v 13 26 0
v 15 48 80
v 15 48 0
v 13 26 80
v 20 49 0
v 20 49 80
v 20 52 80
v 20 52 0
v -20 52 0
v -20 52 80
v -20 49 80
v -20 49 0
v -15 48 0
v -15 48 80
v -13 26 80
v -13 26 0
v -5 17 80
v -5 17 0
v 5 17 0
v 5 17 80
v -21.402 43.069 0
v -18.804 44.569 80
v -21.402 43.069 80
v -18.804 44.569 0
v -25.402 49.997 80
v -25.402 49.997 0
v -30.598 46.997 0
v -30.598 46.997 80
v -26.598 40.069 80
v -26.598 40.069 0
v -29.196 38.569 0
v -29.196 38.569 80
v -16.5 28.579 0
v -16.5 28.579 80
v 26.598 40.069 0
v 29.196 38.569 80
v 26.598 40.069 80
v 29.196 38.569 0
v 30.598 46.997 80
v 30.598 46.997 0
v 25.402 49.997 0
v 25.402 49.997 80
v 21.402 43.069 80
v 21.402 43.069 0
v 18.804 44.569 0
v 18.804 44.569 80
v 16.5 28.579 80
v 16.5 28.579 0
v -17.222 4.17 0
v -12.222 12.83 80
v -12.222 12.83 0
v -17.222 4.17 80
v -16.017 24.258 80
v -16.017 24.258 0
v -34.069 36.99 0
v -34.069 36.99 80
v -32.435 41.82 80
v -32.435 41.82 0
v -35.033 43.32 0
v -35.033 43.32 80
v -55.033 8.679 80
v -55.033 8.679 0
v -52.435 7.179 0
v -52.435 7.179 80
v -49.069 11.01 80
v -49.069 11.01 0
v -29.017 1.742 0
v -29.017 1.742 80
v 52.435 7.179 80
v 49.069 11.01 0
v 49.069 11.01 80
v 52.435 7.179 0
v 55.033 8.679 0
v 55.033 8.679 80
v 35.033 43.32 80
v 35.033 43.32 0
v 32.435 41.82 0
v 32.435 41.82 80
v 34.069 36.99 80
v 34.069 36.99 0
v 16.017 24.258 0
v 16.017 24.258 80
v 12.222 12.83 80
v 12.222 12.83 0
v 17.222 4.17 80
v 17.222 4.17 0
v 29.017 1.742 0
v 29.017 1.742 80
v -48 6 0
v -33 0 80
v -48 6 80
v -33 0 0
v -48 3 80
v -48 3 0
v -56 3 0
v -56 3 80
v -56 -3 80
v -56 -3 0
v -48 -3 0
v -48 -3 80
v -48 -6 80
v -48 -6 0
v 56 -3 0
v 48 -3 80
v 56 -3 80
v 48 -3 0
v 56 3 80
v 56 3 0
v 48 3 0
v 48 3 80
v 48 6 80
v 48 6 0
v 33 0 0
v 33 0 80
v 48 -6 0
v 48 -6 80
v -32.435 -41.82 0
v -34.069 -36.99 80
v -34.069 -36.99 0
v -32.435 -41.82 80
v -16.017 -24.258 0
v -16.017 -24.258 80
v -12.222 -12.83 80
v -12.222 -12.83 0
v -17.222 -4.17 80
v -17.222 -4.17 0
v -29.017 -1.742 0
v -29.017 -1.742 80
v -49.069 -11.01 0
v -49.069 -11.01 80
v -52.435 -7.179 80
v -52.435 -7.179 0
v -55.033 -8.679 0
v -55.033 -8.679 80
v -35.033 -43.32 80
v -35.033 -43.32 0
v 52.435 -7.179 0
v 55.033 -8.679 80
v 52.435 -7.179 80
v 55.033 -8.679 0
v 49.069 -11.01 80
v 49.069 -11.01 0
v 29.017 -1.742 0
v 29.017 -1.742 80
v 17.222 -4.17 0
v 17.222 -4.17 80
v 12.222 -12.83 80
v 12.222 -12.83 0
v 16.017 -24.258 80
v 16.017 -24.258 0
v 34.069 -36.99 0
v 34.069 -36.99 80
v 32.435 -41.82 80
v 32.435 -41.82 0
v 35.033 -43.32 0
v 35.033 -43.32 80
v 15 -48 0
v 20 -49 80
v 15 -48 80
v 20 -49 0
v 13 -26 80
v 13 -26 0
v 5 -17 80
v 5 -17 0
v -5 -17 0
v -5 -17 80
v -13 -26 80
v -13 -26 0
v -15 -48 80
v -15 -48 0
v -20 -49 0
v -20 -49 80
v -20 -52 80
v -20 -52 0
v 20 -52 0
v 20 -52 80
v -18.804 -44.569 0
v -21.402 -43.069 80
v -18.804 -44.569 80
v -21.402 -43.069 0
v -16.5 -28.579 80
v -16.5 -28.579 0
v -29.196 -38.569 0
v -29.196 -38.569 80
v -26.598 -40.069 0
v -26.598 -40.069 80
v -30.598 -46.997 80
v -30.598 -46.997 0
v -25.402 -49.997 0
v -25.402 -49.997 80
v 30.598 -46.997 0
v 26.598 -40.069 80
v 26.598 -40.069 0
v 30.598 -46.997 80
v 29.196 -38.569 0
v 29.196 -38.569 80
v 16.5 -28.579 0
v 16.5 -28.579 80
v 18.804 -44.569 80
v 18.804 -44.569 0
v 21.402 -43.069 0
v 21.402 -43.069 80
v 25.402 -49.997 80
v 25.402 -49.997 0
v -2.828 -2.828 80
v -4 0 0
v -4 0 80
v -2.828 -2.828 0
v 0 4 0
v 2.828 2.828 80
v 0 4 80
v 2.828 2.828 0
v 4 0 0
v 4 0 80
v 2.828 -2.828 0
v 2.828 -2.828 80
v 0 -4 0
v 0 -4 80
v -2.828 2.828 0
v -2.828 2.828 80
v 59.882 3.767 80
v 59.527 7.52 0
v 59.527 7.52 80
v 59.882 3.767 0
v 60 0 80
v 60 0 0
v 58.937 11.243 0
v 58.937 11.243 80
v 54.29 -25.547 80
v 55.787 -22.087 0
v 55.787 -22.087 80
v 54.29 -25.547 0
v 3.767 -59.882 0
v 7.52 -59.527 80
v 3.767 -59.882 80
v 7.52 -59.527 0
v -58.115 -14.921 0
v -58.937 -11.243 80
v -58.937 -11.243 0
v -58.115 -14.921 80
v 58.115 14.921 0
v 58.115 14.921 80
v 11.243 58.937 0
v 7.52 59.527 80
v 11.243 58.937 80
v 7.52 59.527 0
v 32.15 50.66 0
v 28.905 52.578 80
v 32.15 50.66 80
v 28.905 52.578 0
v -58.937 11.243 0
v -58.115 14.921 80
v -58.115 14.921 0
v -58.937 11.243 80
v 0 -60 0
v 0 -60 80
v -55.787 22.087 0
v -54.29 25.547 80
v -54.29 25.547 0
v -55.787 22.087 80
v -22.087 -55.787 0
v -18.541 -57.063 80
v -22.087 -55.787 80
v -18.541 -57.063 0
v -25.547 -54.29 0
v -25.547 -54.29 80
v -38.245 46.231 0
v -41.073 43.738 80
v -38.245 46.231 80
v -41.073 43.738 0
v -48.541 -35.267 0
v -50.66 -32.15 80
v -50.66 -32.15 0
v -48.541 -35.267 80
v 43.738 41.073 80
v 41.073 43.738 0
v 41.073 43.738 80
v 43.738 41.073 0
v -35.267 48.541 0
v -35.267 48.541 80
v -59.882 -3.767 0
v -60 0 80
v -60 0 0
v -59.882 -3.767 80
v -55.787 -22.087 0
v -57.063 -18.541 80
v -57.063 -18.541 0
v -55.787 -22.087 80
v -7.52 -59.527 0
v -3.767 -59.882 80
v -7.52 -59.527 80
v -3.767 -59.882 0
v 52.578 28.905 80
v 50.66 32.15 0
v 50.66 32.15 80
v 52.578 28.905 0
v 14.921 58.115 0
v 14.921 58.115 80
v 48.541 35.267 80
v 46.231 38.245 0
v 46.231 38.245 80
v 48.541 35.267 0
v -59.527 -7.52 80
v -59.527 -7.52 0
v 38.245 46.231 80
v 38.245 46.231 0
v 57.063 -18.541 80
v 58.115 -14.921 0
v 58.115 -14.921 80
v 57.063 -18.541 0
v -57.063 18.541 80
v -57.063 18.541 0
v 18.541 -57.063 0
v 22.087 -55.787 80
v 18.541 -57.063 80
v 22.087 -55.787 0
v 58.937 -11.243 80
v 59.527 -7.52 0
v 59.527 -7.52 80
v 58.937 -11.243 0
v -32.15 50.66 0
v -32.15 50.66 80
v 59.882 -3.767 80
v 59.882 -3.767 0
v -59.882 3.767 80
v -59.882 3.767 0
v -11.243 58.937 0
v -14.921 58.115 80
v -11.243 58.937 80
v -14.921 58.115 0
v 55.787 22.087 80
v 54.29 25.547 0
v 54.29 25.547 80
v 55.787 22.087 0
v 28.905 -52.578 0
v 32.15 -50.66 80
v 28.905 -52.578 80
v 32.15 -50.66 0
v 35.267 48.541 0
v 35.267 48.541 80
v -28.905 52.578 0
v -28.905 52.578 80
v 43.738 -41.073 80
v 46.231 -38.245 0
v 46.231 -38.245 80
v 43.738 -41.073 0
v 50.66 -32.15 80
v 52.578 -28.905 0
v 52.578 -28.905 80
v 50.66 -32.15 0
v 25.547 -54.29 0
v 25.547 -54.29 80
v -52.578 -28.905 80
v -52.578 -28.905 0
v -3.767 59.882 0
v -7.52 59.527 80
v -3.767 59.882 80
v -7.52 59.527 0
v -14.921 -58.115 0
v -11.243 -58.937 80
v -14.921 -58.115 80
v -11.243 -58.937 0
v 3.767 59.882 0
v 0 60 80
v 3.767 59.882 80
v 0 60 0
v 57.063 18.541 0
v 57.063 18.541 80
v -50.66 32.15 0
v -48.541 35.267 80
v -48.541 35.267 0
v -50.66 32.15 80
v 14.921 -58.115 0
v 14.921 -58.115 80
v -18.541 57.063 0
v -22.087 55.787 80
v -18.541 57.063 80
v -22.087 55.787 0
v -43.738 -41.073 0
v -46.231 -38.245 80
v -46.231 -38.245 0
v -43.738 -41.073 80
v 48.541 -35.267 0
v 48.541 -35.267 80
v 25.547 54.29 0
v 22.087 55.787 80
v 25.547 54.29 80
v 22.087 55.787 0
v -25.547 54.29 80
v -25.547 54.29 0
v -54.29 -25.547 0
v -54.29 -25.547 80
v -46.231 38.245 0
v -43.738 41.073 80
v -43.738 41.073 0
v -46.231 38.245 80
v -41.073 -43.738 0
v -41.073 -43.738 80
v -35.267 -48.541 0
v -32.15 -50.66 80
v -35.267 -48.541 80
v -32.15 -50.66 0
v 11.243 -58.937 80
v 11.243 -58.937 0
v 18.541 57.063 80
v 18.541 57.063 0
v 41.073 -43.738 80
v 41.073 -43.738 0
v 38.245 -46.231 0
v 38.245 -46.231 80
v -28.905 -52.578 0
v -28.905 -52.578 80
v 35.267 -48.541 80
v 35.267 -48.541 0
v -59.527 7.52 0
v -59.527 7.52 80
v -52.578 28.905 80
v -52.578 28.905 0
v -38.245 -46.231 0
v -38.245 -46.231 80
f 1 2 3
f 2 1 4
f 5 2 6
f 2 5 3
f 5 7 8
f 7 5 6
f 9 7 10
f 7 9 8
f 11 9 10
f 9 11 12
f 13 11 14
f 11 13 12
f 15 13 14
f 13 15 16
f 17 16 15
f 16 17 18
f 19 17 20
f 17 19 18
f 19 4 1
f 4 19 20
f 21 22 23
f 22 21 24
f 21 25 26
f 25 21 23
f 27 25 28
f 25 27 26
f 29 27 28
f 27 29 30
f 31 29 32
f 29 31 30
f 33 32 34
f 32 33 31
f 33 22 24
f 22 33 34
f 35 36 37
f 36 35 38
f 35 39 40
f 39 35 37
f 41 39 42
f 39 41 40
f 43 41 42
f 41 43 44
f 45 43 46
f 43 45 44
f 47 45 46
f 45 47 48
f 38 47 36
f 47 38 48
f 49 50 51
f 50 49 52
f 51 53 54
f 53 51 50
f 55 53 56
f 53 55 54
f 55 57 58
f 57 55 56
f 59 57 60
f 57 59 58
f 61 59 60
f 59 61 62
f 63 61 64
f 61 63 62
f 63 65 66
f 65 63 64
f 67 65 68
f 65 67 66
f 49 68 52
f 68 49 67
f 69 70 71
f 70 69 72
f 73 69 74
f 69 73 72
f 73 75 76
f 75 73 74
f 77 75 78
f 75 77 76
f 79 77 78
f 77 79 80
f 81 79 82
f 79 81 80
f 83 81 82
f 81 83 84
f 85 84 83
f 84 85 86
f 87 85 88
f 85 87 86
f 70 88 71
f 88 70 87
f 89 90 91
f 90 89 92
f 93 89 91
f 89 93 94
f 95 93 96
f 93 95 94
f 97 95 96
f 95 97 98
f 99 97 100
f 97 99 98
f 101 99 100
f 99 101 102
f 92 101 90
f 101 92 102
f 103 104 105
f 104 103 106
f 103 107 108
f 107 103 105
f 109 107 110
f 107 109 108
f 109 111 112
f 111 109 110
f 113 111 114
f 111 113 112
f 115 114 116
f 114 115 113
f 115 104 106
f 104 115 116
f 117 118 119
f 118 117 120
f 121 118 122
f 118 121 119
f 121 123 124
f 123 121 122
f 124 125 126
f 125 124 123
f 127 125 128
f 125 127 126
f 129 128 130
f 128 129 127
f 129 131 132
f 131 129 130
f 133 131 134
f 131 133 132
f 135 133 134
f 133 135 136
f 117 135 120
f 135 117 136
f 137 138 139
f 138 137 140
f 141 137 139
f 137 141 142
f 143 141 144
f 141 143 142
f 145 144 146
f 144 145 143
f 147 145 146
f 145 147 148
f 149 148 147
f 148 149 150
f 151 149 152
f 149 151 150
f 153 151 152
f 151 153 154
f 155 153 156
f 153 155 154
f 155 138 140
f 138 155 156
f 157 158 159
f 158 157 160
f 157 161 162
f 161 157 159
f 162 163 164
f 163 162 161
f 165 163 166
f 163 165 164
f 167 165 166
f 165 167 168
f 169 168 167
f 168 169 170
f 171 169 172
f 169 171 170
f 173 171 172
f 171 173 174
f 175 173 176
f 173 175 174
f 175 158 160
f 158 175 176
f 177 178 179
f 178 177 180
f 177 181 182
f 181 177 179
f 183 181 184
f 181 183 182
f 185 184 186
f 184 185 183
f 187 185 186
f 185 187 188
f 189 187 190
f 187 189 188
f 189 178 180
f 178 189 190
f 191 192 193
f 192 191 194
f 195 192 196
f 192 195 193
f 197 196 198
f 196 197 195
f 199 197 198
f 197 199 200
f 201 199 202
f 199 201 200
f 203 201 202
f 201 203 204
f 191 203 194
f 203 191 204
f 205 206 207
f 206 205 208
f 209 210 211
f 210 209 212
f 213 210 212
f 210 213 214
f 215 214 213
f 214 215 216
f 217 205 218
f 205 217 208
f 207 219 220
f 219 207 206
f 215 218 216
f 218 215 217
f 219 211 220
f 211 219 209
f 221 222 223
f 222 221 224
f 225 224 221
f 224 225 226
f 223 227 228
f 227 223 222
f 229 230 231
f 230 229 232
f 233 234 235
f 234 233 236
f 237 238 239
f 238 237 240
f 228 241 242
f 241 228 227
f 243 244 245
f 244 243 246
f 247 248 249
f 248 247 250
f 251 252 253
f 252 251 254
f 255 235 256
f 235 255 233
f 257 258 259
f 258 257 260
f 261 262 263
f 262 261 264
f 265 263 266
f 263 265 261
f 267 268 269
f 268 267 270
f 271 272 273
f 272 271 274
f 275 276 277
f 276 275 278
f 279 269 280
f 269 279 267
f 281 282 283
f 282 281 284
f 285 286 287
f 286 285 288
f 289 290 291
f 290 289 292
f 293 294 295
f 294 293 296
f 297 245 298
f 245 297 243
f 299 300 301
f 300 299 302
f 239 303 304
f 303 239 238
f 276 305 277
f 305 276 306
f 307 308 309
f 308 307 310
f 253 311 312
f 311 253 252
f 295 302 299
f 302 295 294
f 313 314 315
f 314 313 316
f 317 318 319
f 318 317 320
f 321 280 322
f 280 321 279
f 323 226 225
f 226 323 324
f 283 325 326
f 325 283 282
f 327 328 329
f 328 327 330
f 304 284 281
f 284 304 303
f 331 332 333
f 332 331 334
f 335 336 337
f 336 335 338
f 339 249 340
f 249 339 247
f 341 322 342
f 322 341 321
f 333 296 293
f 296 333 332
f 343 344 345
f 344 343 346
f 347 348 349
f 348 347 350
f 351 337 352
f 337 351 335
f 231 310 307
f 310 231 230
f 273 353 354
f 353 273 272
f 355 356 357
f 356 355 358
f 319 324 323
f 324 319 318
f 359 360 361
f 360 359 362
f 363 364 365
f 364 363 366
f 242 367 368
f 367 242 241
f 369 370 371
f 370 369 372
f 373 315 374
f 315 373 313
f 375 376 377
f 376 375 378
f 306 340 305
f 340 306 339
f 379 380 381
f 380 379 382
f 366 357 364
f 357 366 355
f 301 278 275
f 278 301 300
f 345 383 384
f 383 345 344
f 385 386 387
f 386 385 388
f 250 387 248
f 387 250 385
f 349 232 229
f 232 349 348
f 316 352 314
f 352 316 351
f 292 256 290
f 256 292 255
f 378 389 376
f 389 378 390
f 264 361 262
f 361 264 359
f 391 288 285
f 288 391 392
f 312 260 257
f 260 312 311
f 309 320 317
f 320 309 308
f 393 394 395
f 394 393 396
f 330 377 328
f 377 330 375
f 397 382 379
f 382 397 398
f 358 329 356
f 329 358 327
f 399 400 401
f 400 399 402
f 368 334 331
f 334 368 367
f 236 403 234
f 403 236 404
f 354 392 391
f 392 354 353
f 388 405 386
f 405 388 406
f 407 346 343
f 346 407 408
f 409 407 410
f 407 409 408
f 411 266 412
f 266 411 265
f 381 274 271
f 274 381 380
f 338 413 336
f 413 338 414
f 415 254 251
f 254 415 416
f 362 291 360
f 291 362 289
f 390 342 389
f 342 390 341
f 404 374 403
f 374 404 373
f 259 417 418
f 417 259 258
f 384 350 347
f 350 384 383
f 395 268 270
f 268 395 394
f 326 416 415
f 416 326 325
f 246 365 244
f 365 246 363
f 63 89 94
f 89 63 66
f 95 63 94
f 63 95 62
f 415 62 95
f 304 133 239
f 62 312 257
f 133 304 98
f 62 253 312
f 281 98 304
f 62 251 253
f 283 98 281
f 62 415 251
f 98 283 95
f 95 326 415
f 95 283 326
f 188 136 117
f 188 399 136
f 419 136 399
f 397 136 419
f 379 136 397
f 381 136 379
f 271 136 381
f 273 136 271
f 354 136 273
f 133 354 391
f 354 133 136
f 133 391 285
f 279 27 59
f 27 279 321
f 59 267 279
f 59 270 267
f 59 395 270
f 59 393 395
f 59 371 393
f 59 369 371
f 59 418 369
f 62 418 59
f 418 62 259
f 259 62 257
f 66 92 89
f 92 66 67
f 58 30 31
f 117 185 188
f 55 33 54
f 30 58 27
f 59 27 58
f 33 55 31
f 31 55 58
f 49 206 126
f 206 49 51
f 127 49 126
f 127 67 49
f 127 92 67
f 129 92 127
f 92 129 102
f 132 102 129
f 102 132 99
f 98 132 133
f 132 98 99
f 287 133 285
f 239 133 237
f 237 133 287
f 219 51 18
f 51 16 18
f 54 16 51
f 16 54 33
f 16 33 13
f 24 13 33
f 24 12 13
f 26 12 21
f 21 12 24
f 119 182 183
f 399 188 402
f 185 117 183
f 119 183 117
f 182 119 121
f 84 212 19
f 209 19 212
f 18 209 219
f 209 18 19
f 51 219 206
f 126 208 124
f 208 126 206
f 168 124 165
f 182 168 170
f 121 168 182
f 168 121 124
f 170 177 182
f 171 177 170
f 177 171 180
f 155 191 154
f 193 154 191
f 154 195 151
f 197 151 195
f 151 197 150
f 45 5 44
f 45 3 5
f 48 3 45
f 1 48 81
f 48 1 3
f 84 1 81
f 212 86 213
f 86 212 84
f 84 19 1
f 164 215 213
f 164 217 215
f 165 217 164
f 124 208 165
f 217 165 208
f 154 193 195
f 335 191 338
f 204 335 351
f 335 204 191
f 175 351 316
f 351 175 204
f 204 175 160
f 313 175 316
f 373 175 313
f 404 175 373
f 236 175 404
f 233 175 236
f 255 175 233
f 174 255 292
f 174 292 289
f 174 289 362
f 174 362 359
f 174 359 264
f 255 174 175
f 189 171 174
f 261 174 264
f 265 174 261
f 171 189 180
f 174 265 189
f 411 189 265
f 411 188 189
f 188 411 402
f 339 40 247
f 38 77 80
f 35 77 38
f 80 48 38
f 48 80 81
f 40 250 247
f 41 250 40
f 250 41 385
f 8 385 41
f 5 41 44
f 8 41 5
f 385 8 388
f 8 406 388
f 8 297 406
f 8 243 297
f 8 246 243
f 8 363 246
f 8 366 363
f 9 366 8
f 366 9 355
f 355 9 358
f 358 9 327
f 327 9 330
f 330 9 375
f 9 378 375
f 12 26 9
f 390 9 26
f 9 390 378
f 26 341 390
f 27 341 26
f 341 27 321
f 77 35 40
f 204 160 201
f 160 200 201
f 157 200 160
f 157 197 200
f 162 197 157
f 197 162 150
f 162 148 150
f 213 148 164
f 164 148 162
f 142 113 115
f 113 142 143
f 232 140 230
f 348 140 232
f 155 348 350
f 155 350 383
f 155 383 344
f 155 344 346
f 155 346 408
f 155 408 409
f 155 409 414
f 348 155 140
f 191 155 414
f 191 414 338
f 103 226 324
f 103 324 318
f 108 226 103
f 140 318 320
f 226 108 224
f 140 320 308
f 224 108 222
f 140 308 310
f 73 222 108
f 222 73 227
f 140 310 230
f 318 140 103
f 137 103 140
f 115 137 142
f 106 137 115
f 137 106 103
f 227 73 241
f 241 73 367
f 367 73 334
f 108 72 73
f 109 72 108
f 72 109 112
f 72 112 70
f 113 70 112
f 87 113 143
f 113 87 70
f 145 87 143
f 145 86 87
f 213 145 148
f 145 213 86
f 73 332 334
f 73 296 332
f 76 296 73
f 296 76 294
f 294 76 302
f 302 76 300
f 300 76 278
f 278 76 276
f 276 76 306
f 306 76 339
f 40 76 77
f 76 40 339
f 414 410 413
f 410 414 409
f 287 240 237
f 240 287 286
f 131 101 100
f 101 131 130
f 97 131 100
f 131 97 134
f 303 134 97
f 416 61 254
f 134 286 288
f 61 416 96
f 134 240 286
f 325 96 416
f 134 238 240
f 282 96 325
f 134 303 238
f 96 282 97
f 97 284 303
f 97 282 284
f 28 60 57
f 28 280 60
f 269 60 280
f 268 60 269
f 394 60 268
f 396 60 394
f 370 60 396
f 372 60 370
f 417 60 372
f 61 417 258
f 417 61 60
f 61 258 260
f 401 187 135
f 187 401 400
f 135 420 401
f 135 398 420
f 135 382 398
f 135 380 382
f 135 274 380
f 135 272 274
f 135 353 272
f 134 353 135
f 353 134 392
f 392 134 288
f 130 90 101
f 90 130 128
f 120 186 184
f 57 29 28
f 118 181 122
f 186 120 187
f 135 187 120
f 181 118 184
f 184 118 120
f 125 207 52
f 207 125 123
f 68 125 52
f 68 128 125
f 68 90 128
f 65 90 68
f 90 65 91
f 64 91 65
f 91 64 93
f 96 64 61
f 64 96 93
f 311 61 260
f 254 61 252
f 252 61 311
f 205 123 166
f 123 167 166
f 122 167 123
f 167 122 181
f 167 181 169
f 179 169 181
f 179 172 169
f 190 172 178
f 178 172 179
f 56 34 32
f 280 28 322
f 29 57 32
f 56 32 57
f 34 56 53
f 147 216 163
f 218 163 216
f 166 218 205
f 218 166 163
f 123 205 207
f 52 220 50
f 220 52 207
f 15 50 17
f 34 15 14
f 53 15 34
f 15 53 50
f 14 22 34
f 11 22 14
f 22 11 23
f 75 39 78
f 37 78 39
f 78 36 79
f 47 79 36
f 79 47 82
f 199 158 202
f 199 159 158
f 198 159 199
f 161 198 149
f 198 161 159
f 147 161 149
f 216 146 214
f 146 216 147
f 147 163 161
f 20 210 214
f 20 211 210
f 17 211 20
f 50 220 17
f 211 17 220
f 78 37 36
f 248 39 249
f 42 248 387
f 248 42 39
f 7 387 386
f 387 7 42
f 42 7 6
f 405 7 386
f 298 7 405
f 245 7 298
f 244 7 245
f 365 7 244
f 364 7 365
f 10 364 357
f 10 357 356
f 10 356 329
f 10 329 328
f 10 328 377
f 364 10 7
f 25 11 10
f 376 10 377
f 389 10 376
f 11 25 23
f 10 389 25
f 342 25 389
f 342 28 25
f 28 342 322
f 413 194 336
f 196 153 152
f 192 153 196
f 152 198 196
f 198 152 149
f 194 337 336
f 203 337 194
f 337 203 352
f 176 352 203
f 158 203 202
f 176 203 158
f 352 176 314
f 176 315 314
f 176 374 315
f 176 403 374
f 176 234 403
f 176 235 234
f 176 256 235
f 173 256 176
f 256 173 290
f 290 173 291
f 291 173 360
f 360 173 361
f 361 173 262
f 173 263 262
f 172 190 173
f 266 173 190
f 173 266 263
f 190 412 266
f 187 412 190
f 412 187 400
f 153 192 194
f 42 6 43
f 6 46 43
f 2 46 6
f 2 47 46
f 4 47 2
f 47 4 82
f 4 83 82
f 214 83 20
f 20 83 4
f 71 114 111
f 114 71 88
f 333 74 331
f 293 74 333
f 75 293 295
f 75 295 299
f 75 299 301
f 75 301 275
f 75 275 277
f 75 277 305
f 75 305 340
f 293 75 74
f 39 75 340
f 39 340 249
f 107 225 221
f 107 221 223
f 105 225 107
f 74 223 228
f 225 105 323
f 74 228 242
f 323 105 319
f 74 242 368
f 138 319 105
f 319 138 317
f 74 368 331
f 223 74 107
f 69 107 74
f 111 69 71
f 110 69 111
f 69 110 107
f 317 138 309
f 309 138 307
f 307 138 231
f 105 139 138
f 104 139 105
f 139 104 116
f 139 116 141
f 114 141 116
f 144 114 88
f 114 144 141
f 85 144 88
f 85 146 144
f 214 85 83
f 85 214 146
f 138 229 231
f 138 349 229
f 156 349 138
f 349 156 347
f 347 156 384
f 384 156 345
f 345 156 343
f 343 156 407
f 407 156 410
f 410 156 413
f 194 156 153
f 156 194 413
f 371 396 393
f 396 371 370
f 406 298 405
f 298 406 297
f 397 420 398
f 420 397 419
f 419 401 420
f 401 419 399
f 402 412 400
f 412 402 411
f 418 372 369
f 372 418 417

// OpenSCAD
// a polygon that approximates a coffee pod (comfortably larger than a pod)
module capsule_cutout() {
    polygon(points=[[-20,0],[20,0],[20,3],[15,4],[13,26],[5,35],[-5,35],[-13,26],[-15,4],[-20,3]]);
}

// open the downward looking face of the capsule polygon.
// used in places where the capsule is ejected
module capsule_cutout_openface() {
    union() {
        capsule_cutout();
        polygon(points=[[-20,0],[20,0],[20,-40],[-20,-40]]);
    }
}


module materialsaver() {
    polygon(points=[[-6,0],[-3,0],[-3,-8],[3,-8],[3,0],[6,0],[0,15]]);
}

// a hexagonal pattern of coffeecup pod cutouts, plus some material saver
module standing_column_cutouts(height=80) {
    linear_extrude(h=height)
    for (angle=[0,60,120,180,240,300]) {
        rotate([0,0,angle]) translate([0,-52,0]) capsule_cutout();
        rotate([0,0,angle+30]) translate([0,-48,0]) materialsaver();
    }
    
}

module standing_column(height=80) {
    difference() {
        cylinder($fn=100,r=60,h=height);
        union() {
            translate([0,0,-1]) standing_column_cutouts(height);
            translate([0,0,-1]) cylinder($fn=8,r=4,h=height+2);
        }
    }
}

module ejector_base(height=30) {
    angle=45;
    m = [[ 1, 0, 0, 0],
         [ 0, 1, -0.3, 0],
         [ 0, 0, 1, 0],
         [ 0, 0, 0, 1]];
    difference() {
        cylinder($fn=100,r=60,h=height);
        translate([0, 0,-1]) multmatrix(m) linear_extrude(h=height) translate([0,-52,0]) capsule_cutout_openface();
    }
}



standing_column();

//ejector_base();
